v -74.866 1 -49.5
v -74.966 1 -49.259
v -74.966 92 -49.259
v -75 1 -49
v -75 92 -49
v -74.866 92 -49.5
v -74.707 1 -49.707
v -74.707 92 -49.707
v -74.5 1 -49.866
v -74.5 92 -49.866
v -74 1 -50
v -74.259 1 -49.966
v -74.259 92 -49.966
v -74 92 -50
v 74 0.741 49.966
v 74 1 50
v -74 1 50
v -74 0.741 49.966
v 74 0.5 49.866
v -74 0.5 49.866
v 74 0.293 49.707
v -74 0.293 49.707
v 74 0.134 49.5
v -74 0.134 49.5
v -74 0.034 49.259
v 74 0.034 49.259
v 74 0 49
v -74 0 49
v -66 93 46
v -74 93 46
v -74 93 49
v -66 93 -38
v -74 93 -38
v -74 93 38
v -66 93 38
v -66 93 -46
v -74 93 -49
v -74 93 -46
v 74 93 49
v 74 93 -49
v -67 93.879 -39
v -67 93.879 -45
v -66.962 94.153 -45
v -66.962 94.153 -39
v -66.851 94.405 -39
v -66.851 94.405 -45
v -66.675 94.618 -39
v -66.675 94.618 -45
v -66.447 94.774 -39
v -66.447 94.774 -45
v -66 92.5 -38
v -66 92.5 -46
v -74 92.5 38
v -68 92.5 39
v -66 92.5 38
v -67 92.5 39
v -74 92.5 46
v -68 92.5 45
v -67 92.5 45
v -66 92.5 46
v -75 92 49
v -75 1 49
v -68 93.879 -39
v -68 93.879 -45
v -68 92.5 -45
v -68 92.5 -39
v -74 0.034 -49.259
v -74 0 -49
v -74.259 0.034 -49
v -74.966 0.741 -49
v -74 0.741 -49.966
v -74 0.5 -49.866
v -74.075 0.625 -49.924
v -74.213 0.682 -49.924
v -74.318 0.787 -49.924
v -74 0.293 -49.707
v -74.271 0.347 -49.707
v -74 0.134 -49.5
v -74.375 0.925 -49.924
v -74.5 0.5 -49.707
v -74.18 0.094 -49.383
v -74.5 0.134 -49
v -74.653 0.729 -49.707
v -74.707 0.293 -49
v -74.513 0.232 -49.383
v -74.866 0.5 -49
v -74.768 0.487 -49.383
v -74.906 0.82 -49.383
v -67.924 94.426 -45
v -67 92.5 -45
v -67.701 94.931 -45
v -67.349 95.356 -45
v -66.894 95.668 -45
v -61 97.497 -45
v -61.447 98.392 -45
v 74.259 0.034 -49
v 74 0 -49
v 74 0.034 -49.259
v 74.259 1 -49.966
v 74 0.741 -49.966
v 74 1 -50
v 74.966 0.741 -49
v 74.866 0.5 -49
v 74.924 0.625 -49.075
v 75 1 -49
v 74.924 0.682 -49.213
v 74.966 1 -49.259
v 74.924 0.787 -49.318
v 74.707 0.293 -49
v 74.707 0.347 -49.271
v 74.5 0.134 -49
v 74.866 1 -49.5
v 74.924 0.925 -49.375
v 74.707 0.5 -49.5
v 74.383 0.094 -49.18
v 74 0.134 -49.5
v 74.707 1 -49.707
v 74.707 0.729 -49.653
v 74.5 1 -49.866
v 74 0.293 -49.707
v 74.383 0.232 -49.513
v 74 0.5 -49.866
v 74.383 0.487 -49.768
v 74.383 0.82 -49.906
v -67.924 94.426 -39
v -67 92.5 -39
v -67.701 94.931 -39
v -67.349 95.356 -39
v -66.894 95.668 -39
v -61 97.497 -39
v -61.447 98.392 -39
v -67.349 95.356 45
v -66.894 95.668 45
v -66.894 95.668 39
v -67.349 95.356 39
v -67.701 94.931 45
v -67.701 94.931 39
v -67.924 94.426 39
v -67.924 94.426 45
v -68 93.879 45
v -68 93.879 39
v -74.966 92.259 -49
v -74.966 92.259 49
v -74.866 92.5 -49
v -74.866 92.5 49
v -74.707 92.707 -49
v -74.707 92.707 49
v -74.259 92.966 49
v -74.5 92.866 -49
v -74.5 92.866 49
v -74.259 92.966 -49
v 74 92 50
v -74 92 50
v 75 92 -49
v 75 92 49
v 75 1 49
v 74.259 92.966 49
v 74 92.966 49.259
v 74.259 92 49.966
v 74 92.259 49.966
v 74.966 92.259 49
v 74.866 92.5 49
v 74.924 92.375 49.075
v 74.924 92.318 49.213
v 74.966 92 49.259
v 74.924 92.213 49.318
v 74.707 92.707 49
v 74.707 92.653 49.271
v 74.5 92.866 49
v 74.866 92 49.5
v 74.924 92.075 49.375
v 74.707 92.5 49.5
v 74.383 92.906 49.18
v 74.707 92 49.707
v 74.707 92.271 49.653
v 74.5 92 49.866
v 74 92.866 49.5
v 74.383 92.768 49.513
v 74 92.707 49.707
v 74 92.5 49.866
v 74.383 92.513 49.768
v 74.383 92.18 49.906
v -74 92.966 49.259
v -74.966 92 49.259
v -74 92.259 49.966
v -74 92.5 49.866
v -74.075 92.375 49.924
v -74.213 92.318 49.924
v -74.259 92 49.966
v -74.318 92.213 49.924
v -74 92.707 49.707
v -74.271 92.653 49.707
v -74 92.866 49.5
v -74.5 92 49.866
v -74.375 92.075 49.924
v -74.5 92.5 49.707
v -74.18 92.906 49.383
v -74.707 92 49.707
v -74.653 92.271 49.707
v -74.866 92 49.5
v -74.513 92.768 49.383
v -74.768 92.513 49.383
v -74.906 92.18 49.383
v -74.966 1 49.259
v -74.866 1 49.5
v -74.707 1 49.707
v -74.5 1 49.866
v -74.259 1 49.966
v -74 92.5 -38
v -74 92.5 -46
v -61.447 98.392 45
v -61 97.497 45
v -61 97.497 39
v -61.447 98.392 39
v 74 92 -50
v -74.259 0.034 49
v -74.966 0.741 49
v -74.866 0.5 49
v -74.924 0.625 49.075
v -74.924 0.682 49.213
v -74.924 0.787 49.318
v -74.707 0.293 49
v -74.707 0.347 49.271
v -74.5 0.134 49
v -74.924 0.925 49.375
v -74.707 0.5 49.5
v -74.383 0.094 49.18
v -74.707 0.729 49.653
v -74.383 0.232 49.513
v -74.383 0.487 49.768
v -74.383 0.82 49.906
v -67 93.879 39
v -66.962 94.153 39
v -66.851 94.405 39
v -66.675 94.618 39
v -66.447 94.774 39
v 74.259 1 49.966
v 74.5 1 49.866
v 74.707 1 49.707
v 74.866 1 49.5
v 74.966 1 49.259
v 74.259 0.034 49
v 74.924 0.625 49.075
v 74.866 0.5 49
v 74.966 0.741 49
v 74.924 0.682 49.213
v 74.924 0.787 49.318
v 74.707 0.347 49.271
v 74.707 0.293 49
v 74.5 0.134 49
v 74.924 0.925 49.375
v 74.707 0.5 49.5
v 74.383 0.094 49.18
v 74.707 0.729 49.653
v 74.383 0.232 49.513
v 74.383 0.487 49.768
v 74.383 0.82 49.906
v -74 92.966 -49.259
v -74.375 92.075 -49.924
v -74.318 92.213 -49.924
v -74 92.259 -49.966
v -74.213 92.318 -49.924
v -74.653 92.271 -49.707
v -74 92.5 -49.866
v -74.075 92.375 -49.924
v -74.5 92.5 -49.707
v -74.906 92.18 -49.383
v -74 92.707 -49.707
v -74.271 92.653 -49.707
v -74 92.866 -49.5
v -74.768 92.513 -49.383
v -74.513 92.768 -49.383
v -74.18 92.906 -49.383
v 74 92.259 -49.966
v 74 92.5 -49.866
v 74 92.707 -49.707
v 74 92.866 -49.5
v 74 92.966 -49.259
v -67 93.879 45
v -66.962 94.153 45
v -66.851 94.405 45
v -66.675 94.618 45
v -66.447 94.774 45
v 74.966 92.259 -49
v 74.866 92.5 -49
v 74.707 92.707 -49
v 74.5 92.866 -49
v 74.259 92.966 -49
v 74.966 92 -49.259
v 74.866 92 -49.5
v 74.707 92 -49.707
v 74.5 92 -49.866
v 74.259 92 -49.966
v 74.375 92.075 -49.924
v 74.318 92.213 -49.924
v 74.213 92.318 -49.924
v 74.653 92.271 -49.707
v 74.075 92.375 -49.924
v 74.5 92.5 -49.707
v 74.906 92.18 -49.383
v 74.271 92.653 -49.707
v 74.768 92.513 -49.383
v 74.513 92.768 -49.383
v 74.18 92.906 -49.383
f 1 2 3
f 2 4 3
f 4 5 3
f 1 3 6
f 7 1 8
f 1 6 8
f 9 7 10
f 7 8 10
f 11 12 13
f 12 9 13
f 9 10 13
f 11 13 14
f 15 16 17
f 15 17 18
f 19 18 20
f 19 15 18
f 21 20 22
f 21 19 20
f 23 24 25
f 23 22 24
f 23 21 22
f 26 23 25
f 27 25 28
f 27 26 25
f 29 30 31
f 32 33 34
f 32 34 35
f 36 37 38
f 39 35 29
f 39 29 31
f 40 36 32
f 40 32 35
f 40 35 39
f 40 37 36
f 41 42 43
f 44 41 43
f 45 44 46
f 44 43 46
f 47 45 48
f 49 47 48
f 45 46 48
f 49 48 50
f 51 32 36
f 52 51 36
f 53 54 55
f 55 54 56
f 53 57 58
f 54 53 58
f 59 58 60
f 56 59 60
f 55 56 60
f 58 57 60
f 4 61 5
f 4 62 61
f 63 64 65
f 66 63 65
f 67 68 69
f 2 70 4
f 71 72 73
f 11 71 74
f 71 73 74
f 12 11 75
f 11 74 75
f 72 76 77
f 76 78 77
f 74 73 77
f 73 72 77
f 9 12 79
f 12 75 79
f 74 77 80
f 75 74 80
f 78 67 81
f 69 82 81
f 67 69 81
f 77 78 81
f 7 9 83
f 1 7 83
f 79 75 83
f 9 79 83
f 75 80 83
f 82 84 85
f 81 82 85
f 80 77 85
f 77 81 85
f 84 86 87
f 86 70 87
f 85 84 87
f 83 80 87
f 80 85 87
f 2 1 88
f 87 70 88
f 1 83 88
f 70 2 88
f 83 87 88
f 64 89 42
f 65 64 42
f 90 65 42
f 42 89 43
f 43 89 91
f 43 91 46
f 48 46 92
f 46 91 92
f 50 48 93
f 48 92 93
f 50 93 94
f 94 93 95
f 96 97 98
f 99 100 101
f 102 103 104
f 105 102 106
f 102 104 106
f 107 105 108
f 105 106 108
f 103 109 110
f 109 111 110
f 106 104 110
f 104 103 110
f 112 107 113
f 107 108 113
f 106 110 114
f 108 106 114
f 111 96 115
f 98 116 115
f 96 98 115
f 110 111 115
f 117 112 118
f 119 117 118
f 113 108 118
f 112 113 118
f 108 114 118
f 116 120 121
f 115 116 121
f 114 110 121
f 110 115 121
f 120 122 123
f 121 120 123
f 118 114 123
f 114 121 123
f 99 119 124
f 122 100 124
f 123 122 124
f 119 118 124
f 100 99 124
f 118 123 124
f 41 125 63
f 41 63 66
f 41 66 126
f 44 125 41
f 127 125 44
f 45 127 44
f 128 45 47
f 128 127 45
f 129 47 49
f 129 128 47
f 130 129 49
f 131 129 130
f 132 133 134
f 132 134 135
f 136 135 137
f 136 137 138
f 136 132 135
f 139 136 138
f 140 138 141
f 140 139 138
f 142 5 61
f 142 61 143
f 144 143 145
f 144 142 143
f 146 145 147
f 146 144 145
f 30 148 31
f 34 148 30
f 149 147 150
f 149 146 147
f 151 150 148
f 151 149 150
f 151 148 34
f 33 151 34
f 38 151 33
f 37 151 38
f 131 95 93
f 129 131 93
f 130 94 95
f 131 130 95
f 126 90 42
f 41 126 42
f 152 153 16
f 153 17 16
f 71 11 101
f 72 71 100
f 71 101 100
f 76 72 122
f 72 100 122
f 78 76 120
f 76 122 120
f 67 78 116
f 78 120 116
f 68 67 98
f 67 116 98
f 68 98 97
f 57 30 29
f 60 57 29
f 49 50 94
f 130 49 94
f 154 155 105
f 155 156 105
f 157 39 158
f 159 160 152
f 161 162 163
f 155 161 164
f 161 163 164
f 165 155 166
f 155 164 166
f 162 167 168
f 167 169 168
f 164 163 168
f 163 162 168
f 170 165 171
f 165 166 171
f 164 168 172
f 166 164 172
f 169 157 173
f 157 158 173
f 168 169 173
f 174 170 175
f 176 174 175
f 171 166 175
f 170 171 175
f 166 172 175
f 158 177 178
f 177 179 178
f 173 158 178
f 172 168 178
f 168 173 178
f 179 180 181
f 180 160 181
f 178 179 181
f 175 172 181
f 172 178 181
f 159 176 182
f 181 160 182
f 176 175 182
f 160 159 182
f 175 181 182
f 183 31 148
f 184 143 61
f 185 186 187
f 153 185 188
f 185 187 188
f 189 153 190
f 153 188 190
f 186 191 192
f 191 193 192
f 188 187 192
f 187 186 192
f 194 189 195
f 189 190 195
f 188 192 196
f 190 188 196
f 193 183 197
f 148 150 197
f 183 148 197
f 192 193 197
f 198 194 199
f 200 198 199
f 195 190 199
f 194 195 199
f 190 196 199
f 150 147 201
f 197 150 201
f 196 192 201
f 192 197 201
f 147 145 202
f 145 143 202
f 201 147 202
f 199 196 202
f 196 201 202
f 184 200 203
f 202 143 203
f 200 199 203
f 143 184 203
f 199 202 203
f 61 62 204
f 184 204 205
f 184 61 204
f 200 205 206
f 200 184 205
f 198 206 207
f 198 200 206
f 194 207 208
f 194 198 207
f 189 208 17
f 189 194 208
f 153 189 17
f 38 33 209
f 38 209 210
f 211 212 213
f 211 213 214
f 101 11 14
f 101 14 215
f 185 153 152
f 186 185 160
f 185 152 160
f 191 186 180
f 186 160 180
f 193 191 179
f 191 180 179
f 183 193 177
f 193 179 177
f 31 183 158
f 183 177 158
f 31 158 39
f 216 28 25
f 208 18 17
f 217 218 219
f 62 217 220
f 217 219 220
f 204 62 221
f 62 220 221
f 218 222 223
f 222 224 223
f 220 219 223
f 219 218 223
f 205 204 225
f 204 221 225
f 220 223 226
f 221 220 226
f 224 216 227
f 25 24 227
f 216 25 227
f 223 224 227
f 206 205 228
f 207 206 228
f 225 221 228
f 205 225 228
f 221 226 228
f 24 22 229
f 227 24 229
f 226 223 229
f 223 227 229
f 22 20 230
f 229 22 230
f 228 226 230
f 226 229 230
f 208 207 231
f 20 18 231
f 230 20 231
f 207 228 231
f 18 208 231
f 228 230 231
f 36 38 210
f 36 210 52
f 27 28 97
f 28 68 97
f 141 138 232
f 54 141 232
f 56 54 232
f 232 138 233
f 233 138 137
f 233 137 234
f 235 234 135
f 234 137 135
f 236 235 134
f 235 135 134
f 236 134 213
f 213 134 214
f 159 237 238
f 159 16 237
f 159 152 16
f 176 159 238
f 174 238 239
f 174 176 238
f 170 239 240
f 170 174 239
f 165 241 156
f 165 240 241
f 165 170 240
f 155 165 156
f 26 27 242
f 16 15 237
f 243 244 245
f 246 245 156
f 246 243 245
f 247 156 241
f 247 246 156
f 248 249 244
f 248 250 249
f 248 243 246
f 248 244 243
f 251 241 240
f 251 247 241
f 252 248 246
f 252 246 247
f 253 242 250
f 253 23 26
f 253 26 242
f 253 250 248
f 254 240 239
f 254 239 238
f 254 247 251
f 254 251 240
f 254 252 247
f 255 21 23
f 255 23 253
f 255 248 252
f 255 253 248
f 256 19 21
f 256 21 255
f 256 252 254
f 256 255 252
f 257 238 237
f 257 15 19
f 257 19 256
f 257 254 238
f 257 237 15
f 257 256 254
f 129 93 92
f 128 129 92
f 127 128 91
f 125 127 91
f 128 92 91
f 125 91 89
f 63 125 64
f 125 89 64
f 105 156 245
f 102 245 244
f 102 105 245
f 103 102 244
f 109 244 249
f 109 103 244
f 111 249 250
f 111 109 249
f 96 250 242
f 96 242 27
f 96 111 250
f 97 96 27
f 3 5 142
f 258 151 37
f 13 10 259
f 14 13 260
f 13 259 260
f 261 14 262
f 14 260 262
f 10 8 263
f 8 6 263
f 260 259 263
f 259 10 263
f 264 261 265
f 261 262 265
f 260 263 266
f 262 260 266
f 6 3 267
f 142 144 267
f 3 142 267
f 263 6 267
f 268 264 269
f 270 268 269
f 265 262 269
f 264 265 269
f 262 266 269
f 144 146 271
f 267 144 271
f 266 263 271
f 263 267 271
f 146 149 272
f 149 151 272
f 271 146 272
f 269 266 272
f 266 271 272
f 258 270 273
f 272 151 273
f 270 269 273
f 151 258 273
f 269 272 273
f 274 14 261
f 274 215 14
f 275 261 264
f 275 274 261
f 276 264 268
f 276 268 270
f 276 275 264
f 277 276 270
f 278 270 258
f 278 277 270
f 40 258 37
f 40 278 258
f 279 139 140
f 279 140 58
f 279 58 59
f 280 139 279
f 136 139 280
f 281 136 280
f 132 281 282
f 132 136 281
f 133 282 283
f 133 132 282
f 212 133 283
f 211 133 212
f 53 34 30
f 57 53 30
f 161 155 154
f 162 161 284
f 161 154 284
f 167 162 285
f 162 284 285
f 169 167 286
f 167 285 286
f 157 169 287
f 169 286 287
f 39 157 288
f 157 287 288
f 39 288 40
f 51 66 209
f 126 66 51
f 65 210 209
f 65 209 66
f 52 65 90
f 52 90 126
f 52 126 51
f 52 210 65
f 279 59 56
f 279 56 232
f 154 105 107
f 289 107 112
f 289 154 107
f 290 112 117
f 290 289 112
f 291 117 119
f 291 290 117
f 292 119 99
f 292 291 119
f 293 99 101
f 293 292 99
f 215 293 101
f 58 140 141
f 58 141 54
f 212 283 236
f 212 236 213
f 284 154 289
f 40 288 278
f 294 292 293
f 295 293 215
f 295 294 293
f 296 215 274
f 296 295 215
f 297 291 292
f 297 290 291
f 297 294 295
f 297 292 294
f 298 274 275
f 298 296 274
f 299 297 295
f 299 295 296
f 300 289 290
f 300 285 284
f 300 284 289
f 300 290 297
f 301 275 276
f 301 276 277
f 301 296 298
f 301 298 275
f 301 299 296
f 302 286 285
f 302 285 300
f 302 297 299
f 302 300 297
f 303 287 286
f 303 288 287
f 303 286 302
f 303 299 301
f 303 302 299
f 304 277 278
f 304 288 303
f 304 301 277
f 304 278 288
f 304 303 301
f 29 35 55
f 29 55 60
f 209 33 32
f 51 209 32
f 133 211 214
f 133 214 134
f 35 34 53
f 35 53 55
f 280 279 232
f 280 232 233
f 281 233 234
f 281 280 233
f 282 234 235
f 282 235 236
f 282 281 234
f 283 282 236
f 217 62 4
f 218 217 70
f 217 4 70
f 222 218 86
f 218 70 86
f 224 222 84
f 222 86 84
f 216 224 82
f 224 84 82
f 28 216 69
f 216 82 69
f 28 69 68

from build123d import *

# Parameters (mm, degrees)
SKETCH1_W           = 150
SKETCH1_H           = 100
BOSS_EXTRUDE1_DEPTH = 93
FILLET1_R           = 1
SKETCH2_W           = 8
SKETCH2_H           = 8
CUT_EXTRUDE1_DEPTH  = 0.5
EXTRUDE_THIN1_START = 1
EXTRUDE_THIN1_DEPTH = 6


with BuildPart() as part:
    # Sketch1 → Boss-Extrude1 (new body)
    with BuildSketch(Plane(origin=(0, 0, 0), x_dir=(1, 0, 0), z_dir=(0, 1, 0))):
        Rectangle(SKETCH1_W, SKETCH1_H)
    extrude(amount=BOSS_EXTRUDE1_DEPTH)

    # Fillet1
    fillet1_edges = [part.edges().sort_by_distance(p)[0] for p in [
        (-75, 93, 0),
        (0, 93, 50),
        (75, 93, 0),
        (0, 0, 50),
        (-75, 0, 0),
        (0, 0, -50),
        (75, 0, 0),
        (75, 46.5, 50),
        (-75, 46.5, 50),
        (-75, 46.5, -50),
        (75, 46.5, -50),
        (0, 93, -50),
    ]]
    fillet(fillet1_edges, radius=FILLET1_R)

    # Sketch2 → Cut-Extrude1 (cut)
    with BuildSketch(Plane(origin=(0, 93, 0), x_dir=(1, 0, 0), z_dir=(0, 1, 0))):
        with Locations((-70, 42)):
            Rectangle(SKETCH2_W, SKETCH2_H)
    cut_extrude1 = extrude(amount=-CUT_EXTRUDE1_DEPTH, mode=Mode.SUBTRACT)

    # Mirror1: Cut-Extrude1 across plane
    add(cut_extrude1.mirror(Plane.XY), mode=Mode.SUBTRACT)

    # Sketch3 → Extrude-Thin1 (add)
    with BuildSketch(Plane.XY.offset(-46).offset(EXTRUDE_THIN1_START)):
        with BuildLine():
            Line((-67, 92.5), (-67, 93.879345126))
            ThreePointArc((-67, 93.879345126), (-66.850650808, 94.405076238), (-66.447213595, 94.773772317))
            Line((-66.447213595, 94.773772317), (-61, 97.497379115))
            Line((-61, 97.497379115), (-61.447213595, 98.391806306))
            Line((-61.447213595, 98.391806306), (-66.894427191, 95.668199508))
            ThreePointArc((-66.894427191, 95.668199508), (-67.701301617, 94.93080735), (-68, 93.879345126))
            Line((-68, 93.879345126), (-68, 92.5))
            Line((-68, 92.5), (-67, 92.5))
        make_face()
    extrude_thin1 = extrude(amount=EXTRUDE_THIN1_DEPTH)

    # Mirror2: Extrude-Thin1 across plane
    add(extrude_thin1.mirror(Plane.XY))


solid = part.part
